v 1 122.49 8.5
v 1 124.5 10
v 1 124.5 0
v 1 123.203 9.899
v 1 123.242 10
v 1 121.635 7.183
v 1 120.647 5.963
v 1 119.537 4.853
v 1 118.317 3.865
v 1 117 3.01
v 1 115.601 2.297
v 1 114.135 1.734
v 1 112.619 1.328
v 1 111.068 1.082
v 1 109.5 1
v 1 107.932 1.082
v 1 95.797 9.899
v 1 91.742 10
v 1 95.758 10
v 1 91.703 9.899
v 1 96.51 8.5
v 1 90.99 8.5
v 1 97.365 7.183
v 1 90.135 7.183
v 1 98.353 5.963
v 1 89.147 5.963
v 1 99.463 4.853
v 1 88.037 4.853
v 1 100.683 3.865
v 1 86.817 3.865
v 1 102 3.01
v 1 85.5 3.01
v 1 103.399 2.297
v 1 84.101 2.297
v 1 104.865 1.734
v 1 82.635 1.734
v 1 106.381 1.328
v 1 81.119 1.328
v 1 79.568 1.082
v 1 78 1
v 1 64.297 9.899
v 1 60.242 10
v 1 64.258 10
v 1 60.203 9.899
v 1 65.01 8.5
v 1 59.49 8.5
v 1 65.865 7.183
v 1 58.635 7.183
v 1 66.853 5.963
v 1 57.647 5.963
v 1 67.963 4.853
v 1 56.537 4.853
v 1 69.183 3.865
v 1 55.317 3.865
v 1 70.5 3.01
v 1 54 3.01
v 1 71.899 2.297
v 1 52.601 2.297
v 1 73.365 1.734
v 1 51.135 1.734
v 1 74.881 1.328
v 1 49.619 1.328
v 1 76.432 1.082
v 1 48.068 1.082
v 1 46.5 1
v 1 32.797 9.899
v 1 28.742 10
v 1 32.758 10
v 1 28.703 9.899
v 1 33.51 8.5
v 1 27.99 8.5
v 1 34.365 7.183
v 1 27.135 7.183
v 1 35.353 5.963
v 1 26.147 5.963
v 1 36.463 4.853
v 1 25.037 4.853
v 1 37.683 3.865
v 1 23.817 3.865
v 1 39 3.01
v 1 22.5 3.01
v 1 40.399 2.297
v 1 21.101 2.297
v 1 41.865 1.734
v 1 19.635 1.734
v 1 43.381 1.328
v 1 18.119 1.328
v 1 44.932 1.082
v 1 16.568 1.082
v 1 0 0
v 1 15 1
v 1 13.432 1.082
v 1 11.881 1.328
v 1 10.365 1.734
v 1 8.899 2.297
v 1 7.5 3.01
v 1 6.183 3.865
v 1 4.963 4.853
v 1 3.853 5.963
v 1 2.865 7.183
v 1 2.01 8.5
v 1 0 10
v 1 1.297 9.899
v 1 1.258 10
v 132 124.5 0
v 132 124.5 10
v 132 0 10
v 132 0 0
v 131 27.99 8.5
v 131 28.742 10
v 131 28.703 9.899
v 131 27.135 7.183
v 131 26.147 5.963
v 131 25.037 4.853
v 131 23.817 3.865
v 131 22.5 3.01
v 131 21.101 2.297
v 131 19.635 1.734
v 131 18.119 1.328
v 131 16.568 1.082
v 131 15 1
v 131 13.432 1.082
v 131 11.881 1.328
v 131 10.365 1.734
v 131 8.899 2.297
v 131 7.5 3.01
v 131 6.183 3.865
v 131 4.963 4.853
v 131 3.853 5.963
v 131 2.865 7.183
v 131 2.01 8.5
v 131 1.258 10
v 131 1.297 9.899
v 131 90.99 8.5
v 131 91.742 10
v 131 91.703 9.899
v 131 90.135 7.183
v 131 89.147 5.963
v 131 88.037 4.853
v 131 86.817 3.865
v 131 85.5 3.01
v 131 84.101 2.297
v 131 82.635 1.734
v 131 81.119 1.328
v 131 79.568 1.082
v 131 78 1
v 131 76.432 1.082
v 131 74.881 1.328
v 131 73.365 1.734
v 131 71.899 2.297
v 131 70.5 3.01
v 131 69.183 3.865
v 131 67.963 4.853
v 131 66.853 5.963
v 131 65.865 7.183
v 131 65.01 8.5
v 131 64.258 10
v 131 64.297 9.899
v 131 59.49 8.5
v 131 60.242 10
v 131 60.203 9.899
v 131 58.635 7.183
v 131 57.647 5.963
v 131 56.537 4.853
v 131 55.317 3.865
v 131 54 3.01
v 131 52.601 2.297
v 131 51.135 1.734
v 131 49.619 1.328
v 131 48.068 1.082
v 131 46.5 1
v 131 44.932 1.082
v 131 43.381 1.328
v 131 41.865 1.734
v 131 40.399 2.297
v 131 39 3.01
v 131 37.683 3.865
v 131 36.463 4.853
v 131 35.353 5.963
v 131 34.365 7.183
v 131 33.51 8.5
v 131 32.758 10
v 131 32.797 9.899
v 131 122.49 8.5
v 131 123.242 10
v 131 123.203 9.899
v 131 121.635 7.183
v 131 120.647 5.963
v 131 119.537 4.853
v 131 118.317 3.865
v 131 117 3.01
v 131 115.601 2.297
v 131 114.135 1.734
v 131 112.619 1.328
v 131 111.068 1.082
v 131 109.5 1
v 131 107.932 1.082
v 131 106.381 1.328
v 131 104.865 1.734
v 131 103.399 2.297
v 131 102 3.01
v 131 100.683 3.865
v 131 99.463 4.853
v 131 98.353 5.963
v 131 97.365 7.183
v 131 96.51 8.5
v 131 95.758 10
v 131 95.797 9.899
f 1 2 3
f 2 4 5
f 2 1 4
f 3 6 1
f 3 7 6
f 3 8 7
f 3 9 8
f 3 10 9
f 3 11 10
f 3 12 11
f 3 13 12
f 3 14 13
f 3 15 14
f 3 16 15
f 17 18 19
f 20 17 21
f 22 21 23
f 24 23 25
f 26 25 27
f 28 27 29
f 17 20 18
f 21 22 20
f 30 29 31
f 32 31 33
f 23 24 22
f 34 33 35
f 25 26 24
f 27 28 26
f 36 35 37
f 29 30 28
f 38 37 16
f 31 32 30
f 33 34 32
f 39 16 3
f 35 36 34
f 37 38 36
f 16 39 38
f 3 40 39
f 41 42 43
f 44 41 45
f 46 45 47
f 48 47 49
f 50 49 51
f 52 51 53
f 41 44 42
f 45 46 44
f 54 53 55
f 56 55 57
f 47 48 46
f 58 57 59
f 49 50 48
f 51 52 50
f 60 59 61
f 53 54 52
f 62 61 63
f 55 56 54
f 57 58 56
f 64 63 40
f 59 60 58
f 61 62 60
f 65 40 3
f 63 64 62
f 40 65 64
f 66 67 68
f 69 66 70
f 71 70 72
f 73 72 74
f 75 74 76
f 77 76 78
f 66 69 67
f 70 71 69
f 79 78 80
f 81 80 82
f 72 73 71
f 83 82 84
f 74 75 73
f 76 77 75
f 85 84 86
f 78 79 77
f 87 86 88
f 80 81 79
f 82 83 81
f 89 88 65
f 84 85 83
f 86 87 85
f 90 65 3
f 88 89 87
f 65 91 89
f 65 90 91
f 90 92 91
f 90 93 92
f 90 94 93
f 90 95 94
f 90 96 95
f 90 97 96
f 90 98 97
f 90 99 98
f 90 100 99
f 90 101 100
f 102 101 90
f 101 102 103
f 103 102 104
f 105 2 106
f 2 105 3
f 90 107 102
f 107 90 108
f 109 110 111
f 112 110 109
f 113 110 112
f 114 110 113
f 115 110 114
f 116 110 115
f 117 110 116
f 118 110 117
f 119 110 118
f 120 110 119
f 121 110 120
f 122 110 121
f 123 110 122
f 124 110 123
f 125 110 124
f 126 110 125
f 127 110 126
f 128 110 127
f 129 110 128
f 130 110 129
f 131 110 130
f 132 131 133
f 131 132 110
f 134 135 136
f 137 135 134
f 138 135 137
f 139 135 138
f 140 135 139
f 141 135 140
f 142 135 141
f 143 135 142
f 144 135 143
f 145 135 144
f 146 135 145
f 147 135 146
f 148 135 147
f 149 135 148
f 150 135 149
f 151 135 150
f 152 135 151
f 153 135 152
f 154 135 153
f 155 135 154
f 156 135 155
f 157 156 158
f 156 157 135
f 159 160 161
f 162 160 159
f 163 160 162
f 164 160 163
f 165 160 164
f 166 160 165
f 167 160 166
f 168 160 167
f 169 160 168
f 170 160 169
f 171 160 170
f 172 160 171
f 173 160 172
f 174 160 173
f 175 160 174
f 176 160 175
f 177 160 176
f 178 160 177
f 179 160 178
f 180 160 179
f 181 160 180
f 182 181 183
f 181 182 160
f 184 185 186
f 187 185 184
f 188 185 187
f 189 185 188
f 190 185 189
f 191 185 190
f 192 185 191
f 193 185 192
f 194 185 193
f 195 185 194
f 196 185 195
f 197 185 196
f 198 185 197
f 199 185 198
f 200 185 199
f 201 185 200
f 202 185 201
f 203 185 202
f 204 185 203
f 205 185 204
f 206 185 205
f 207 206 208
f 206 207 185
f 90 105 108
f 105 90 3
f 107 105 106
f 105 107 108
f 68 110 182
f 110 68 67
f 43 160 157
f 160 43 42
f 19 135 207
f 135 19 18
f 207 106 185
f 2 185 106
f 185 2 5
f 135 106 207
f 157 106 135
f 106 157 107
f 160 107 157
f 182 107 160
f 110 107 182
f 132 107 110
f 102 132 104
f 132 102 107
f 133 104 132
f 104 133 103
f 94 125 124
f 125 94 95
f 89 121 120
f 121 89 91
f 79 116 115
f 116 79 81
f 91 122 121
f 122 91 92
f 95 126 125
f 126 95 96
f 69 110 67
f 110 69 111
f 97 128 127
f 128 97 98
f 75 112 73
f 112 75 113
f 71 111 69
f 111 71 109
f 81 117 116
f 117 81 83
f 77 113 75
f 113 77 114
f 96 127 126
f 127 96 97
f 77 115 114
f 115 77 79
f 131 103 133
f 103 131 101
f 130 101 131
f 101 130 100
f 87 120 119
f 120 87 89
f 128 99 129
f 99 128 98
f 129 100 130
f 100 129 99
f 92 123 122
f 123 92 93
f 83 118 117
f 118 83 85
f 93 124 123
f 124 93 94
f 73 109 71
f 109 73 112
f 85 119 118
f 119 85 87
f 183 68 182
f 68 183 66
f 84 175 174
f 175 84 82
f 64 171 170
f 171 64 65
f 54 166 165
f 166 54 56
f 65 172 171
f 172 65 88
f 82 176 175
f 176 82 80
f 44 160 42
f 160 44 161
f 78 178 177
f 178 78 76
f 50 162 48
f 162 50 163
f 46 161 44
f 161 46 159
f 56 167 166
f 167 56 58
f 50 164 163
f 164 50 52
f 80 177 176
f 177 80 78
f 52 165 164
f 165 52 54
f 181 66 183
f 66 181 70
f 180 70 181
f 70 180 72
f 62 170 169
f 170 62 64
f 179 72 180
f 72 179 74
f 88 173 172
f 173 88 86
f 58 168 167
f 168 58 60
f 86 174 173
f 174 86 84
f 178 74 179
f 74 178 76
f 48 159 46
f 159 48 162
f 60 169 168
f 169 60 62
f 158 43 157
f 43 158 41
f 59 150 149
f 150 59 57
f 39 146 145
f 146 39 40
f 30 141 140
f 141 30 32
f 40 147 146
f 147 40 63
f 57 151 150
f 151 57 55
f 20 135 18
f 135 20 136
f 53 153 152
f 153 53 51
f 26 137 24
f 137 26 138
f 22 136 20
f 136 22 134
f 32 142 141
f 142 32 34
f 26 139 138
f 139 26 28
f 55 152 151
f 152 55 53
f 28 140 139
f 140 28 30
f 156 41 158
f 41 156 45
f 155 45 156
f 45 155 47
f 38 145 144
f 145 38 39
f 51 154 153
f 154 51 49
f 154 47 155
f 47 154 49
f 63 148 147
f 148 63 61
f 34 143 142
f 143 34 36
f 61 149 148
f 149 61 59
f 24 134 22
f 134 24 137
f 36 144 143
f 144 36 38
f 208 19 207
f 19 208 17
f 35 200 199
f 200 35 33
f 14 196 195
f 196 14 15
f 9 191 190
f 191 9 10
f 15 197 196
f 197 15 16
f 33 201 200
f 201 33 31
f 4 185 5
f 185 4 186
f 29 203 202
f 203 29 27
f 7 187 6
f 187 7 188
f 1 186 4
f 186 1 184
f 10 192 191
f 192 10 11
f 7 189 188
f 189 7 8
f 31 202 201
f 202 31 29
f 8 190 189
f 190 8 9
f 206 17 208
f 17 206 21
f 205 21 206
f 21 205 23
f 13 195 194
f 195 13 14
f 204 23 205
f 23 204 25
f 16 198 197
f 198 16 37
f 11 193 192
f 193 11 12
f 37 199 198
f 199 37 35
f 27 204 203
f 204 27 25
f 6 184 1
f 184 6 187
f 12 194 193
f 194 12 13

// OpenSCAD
// =============================================
// 3D: Horizontal Holder for 4 Bottles (130x30)
// Version: 1.0
// Author: ChatGPT (OpenSCAD)
// =============================================

// ----------------------------
description = "Horizontal Holder for 4 Bottles (130x30)";

// Shared library
use <../modules.scad>
// ----------------------------
// Настройка точности
// ----------------------------
$fn = 0;        // фиксированную сегментацию отключаем
$fa = 6;        // 5–8° обычно достаточно
$fs = 0.35;     // ≈ диаметр сопла (0.3–0.5 для сопла 0.4)
pin_fs = 0.25;  // для цилиндров высокой точности

// ----------------------------
// Тестовые фрагменты
// ----------------------------
test_fragment = false;  // true — печатать только укороченные фрагменты
frag_size     = 20;     // размер окна вырезки по XY
frag_index    = 0;      // 0=НЛ, 1=ВЛ, 2=НП, 3=ВП (относительно основания)
frag_gap_x    = 10;     // зазор между фрагментами по X, мм
frag_h_extra  = 12;     // запас по высоте клипа, мм

// ----------------------------
// Зазоры/фаски (совместимость)
// ----------------------------
edge_chamfer_z = 0;      // не используем, но оставим для совместимости
edge_chamfer_x = 0;
edge_chamfer_y = 0;
screen_frame_gap = 0.2;  // не влияет здесь

// ----------------------------
// Параметры модели
// ----------------------------
bottle_diam   = 30;      // диаметр бутылки, мм
bottle_len    = 130;     // длина бутылки по X, мм
num_bottles   = 4;       // количество бутылок в ряду (по Y)
pad_between   = 1.5;     // прокладка/зазор между бутылками (1–2 мм)

// Габариты/толщины
rail_w        = 0;       // боковые рельсы убраны
rail_h        = 6;       // высота рельса по Z, мм
base_th       = 2;       // толщина тонкой базы между рельсами, мм
bridge_th     = 2;       // толщина облегчённых перемычек (мостов), мм
bridge_pitch  = 35;      // шаг перемычек по X, мм
end_stop_h    = 10;       // высота торцевых упоров, мм
end_stop_th   = 1;       // толщина торцевых упоров по X, мм
max_h         = 50;      // ограничение по высоте всей детали, мм

// Вычисляемые размеры
inner_w = num_bottles*bottle_diam + (num_bottles-1)*pad_between;      // рабочая ширина между рельсами
tot_w   = inner_w; // + 2*rail_w;                                          // общая ширина
tot_l   = bottle_len + 2*end_stop_th;                                  // общая длина (с упорами)

// Низкий подпрофиль «ложемента» — высота положительного сегмента
saddle_h = min(max_h - rail_h, bottle_diam/3);                         // не выше трети диаметра
saddle_w = max(bottle_diam/2, 12);                                     // ширина контакта по Y
// Срез по Z сверху на высоте торцевого упора
z_cap  = rail_h + end_stop_h;
// Полная высота модели для переворота по Z
total_h = z_cap;

// Центры бутылок по Y
function bottle_center_y(i) = bottle_diam/2 + i*(bottle_diam + pad_between);

// ----------------------------
// Вспомогательные модули
// ----------------------------
// Режущий цилиндр для выемки (полуканавка) вдоль X, ограниченный по высоте
module saddle_cutter(center_y){
    intersection(){
        // цилиндр вдоль X, начинается после левого упора и заканчивается перед правым
        translate([end_stop_th, center_y, 0])
            rotate([0,90,0])
                cylinder(h=bottle_len, d=bottle_diam, $fs=pin_fs, $fa=6);
        // ограничиваем область выемки только внутренней зоной между рельсами и по Z до z_cap
        translate([end_stop_th, 0, 00])
            cube([bottle_len, inner_w, z_cap], center=false);
    }
}

// Левый/правый рельс
module rail_left(){}
module rail_right(){}

// Облегчённые перемычки по X между рельсами (мосты)
module bridges_light(){
    for(x = [end_stop_th : bridge_pitch : (tot_l - end_stop_th)])
        translate([x, 0, 0]) cube([bridge_th, inner_w, base_th], center=false);
}

// Торцевые упоры по X только между рельсами
module end_stops(){
    // у левого края
    // translate([0, 0, rail_h]) cube([end_stop_th, inner_w, end_stop_h], center=false);
    // у правого края
    translate([tot_l - end_stop_th, rail_w, rail_h]) cube([end_stop_th, inner_w, end_stop_h], center=false);
}

// Объединение всех выемок
module cradle_cuts(){
    for(i = [0 : num_bottles-1])
        saddle_cutter(bottle_center_y(i));
    // Убираем внешние стенки по краям: дополнительные полуканавки за пределами рабочей области
    saddle_cutter(-bottle_diam/2);
    saddle_cutter(inner_w + bottle_diam/2);
}

// Сплошная внутреняя плита между рельсами на высоту выемки (будет облегчена вычитанием цилиндров)
module deck_core(){
    translate([end_stop_th, 0, 0])
        cube([bottle_len, inner_w, z_cap], center=false);
}

// Полная сборка (сырая, без финального среза по Z)
module base_raw(){
    difference(){
        union(){
            // боковые рельсы убраны
            // Тонкие мосты снизу для жёсткости
            bridges_light();
            // Основной объём под выемки
            deck_core();
            end_stops();
        }
        cradle_cuts();
        translate(v = [-10, -10, -z_cap])
          cube([tot_l+20, inner_w+20, 22], center=false);
    }
}

// Срезаем верх по z_cap на всякий случай
module base(){
    base_raw();
}

// ----------------------------
// Клиппер фрагментов
// ----------------------------
module clip_for_fragments(){
    if(test_fragment){
        // Фрагмент у левого торца
        intersection(){
            children();
            translate([-eps(), -eps(), -frag_h_extra])
                cube([frag_size, tot_w + 2*eps(), rail_h + end_stop_h + saddle_h + 2*frag_h_extra], center=false);
        }
        // Фрагмент у правого торца
        translate([frag_size + frag_gap_x, 0, 0])
            intersection(){
                children();
                translate([tot_l - frag_size, -eps(), -frag_h_extra])
                    cube([frag_size + eps(), tot_w + 2*eps(), rail_h + end_stop_h + saddle_h + 2*frag_h_extra], center=false);
            }
    }else{
        children();
    }
}

// Вывод модели
module flipped(){
    // Переворачиваем по Z так, чтобы низ был на Z=0
    translate([0,0,total_h]) mirror([0,0,1]) base();
}

clip_for_fragments() flipped();
